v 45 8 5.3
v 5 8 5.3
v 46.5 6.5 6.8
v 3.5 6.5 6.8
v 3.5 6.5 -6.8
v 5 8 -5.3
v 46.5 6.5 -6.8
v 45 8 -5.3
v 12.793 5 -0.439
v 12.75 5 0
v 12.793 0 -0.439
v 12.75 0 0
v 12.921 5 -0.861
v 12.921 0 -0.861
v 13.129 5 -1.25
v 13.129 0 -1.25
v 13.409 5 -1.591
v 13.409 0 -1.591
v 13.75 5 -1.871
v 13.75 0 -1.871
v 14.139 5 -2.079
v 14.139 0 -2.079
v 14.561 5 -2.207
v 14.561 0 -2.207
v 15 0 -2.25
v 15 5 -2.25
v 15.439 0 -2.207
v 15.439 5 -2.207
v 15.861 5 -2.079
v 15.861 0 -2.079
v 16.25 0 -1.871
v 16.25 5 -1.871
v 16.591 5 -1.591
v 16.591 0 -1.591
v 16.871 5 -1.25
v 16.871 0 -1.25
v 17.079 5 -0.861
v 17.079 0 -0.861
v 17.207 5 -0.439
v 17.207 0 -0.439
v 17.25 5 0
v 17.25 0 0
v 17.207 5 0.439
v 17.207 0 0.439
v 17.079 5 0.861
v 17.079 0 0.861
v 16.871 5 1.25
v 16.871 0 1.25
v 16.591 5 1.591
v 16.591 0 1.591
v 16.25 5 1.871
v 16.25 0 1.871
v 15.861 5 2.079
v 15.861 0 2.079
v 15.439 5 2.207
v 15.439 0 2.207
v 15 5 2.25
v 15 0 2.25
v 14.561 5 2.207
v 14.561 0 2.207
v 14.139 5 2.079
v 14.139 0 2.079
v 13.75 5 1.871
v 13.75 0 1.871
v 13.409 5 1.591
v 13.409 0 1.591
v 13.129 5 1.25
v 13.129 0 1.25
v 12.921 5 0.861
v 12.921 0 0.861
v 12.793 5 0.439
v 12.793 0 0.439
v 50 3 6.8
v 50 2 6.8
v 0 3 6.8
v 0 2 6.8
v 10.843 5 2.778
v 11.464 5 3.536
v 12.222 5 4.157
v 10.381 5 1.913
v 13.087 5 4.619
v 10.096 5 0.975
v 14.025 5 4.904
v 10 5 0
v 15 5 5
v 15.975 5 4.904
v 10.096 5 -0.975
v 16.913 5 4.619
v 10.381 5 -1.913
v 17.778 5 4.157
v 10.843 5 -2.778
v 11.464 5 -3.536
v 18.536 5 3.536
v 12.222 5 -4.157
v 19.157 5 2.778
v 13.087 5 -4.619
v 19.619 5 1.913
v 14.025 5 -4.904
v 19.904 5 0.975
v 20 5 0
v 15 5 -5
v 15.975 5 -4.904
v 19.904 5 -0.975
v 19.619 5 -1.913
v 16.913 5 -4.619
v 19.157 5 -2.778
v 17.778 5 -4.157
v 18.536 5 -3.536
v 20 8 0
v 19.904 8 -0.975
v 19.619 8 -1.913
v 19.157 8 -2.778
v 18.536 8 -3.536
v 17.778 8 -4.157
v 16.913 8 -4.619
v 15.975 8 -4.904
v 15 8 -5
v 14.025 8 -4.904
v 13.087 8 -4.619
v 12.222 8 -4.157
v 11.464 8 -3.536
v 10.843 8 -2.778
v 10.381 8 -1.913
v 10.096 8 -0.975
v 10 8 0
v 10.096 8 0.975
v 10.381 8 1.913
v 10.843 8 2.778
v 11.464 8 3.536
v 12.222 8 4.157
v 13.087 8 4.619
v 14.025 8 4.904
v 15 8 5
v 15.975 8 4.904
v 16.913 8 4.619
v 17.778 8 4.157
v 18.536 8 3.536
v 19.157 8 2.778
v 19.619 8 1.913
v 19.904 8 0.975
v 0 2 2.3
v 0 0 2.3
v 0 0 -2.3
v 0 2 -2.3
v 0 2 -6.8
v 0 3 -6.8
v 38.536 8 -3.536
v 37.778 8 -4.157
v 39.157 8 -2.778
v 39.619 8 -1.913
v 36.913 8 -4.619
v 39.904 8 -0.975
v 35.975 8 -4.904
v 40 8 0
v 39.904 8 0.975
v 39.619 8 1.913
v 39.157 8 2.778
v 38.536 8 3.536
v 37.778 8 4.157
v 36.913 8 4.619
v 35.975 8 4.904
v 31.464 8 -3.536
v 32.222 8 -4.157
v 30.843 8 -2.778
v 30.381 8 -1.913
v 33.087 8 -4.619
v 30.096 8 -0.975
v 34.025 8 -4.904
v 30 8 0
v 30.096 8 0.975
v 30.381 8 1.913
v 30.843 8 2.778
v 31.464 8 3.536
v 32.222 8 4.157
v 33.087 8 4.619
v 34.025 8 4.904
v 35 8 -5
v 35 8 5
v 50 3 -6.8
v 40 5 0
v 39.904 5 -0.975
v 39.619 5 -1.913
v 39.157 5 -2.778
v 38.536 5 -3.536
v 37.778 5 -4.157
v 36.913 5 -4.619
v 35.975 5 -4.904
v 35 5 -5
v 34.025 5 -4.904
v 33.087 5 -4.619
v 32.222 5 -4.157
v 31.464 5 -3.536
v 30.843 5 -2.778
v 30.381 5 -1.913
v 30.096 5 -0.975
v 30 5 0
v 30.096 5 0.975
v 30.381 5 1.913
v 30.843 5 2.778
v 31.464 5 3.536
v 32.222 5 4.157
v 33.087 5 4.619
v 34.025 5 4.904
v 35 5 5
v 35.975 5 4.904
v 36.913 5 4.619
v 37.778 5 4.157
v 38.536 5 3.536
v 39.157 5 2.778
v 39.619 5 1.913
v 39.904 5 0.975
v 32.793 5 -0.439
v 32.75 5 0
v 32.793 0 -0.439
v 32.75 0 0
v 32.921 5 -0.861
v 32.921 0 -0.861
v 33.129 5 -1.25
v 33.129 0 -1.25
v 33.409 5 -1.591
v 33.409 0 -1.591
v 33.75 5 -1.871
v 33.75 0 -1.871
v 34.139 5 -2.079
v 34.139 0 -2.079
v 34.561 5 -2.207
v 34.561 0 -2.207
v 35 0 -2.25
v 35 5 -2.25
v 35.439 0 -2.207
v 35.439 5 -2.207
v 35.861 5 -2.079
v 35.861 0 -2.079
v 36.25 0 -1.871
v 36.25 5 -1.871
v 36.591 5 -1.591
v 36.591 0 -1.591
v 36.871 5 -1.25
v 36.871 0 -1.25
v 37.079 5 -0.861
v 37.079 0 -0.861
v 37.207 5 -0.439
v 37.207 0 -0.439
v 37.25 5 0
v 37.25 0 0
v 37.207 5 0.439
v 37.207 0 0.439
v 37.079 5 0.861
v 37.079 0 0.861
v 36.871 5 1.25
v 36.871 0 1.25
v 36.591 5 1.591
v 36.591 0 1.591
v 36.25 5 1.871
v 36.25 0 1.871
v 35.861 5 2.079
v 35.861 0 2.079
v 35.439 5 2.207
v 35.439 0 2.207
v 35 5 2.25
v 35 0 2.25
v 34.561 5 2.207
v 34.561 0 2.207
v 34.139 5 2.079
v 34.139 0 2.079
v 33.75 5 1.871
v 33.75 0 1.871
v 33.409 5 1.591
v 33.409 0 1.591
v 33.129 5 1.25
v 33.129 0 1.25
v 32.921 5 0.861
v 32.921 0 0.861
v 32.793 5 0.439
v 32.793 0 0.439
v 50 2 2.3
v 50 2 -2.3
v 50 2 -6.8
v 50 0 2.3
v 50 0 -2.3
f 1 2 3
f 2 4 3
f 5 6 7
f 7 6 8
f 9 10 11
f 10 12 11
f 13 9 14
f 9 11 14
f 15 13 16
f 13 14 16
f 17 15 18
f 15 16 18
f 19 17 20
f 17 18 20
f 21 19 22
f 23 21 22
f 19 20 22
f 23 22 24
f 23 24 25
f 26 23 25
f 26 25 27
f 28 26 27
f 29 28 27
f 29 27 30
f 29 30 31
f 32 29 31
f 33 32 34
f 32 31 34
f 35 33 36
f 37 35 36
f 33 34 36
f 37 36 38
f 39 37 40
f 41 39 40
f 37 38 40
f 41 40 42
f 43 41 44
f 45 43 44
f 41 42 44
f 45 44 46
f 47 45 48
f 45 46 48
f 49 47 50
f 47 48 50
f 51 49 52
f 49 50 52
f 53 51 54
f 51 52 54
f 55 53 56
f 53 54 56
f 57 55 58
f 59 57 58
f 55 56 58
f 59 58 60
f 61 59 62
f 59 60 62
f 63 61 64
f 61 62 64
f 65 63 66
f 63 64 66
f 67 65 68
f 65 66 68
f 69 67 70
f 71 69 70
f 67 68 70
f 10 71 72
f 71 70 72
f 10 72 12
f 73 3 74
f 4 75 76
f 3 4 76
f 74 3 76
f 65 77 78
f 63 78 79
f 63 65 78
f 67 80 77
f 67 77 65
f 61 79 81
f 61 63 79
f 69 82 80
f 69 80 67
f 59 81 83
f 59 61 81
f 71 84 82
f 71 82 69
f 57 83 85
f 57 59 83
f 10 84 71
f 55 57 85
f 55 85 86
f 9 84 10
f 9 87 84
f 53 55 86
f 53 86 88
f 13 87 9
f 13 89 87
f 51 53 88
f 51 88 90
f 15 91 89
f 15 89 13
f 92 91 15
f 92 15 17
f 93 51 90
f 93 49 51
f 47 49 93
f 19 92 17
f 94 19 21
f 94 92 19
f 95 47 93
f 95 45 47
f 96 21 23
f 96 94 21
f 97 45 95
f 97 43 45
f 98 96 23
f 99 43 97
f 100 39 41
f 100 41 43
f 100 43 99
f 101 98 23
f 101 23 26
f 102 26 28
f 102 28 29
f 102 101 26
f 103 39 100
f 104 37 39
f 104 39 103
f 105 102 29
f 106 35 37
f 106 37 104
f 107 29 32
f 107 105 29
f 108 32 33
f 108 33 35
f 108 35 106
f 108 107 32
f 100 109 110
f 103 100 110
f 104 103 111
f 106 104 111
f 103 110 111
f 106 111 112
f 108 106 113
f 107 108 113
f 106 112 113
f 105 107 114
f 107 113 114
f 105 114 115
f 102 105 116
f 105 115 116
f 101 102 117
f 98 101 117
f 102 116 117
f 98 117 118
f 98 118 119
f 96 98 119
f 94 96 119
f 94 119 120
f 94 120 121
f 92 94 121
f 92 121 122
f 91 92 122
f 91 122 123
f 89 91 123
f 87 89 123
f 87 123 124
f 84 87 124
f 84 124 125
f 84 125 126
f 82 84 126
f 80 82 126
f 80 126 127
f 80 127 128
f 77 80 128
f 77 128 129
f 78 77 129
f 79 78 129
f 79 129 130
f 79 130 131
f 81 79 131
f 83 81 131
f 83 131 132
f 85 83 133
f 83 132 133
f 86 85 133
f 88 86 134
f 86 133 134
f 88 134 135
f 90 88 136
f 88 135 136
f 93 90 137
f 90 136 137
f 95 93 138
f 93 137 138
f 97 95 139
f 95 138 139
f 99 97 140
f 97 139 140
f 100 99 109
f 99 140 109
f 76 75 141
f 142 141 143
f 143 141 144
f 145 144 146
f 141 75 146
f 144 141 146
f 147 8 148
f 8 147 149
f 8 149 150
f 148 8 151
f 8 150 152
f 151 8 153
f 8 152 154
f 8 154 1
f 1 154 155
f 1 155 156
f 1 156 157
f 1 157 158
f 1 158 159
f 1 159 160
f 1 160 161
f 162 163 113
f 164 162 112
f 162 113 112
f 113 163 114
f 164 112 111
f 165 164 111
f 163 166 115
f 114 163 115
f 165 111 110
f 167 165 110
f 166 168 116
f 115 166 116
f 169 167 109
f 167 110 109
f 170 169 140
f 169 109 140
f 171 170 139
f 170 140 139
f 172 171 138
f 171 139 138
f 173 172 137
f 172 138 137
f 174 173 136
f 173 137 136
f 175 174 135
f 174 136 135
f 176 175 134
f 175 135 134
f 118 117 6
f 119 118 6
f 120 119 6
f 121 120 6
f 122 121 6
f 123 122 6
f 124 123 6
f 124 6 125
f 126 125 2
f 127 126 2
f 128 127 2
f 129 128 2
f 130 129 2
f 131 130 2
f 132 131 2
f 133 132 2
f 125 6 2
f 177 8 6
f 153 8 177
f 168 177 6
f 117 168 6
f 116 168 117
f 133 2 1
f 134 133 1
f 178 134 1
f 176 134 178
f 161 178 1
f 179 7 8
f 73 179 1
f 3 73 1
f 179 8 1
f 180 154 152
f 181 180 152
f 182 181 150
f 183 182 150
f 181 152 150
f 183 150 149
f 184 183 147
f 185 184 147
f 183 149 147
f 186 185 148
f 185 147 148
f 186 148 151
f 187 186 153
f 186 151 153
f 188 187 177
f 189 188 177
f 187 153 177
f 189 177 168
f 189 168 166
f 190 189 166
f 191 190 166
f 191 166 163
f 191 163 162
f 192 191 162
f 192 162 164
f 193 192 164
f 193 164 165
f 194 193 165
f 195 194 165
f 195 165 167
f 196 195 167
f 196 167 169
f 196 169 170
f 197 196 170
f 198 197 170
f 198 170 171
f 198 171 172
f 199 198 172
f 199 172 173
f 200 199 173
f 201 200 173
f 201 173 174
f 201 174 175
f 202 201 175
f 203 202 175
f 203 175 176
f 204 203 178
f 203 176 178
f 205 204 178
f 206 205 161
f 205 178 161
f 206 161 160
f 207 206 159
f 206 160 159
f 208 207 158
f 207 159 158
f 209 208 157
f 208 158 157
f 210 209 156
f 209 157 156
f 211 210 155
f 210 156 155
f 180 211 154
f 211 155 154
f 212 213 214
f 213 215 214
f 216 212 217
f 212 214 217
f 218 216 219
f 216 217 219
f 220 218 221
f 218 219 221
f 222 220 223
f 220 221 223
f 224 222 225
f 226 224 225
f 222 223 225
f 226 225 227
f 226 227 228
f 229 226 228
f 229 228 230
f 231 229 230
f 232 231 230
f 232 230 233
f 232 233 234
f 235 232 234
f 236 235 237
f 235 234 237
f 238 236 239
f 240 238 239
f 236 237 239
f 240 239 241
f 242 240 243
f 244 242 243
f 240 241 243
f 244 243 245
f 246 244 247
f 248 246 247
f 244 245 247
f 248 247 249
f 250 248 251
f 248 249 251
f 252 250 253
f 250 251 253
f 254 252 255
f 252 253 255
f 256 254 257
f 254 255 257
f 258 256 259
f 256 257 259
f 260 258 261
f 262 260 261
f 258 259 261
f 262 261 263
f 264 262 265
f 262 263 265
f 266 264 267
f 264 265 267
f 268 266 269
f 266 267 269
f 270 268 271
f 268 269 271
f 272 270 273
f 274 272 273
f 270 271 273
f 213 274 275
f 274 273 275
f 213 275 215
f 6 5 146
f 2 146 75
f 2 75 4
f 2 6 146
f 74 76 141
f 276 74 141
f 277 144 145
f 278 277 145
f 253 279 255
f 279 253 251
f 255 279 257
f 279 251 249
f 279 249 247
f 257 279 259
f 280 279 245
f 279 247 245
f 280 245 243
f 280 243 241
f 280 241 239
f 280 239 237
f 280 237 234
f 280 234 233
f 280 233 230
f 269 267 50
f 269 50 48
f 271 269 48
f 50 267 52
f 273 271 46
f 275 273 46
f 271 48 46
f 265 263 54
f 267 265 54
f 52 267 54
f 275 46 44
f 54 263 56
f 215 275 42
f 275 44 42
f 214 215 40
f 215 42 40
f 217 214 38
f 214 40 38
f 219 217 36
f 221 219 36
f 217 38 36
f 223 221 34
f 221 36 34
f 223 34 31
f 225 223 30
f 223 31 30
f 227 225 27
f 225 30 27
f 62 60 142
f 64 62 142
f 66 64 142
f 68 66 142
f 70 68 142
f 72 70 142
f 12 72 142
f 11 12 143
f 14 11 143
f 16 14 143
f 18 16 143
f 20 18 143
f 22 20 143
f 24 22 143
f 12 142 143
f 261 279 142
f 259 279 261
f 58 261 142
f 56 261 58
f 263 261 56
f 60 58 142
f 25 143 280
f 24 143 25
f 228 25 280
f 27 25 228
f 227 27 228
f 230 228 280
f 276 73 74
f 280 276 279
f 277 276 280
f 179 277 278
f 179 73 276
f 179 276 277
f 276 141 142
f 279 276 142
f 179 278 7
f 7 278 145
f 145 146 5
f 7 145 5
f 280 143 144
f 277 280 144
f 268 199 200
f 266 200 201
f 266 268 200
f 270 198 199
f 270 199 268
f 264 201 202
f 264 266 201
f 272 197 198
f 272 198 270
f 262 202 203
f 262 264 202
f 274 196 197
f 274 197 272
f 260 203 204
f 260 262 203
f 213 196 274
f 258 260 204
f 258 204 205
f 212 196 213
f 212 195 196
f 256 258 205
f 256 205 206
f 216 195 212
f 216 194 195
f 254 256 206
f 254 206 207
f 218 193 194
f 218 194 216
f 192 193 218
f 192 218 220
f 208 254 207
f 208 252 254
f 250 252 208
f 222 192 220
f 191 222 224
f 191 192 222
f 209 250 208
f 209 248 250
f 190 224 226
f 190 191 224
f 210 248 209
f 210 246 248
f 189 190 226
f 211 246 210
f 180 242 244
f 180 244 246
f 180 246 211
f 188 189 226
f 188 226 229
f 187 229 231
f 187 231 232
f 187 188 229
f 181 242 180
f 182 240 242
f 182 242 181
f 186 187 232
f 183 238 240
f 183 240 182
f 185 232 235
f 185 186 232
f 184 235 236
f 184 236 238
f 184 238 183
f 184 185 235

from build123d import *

# Parameters (mm, degrees)
ESTRUSIONE_ESTRUSIONE1_DEPTH                         = 50
SMUSSO1_SIZE                                         = 1.5
SMUSSO2_SIZE                                         = 5
FORO_LAMATO_PER_BULLONE_M5_A_TESTA_ESAGO_D           = 4.5
FORO_LAMATO_PER_BULLONE_M5_A_TESTA_ESAGO_DEPTH       = 70
FORO_LAMATO_PER_BULLONE_M5_A_TESTA_ESAGO_CBORE_D     = 10
FORO_LAMATO_PER_BULLONE_M5_A_TESTA_ESAGO_CBORE_DEPTH = 3
FORO_LAMATO_PER_BULLONE_M5_A_TESTA_ESAGO_TIP         = 1.351936393


with BuildPart() as part:
    # Schizzo1 → Estrusione-Estrusione1 (new body)
    with BuildSketch(Plane(origin=(0, 0, 0), x_dir=(0, 0, -1), z_dir=(1, 0, 0))):
        Polygon((-2.3, 0), (2.3, 0), (2.3, 2), (6.8, 2), (6.8, 8), (-6.8, 8), (-6.8, 2), (-2.3, 2), align=None)
    extrude(amount=ESTRUSIONE_ESTRUSIONE1_DEPTH)

    # Smusso1
    smusso1_edges = [part.edges().sort_by_distance(p)[0] for p in [
        (25, 8, 6.8),
        (25, 8, -6.8),
    ]]
    chamfer(smusso1_edges, length=SMUSSO1_SIZE)

    # Smusso2
    smusso2_edges = [part.edges().sort_by_distance(p)[0] for p in [
        (50, 8, 0),
        (0, 8, 0),
    ]]
    chamfer(smusso2_edges, length=SMUSSO2_SIZE)

    # Foro lamato per Bullone M5 a testa esagonale-1
    with Locations(Plane(origin=(0, 8, 0), x_dir=(1, 0, 0), z_dir=(0, 1, 0))):
        with Locations((15, 0), (35, 0)):
            CounterBoreHole(FORO_LAMATO_PER_BULLONE_M5_A_TESTA_ESAGO_D / 2, FORO_LAMATO_PER_BULLONE_M5_A_TESTA_ESAGO_CBORE_D / 2, FORO_LAMATO_PER_BULLONE_M5_A_TESTA_ESAGO_CBORE_DEPTH, depth=FORO_LAMATO_PER_BULLONE_M5_A_TESTA_ESAGO_DEPTH)
            with Locations((0, 0, -(FORO_LAMATO_PER_BULLONE_M5_A_TESTA_ESAGO_DEPTH + FORO_LAMATO_PER_BULLONE_M5_A_TESTA_ESAGO_TIP / 2))):  # 118° drill point
                Cone(0, FORO_LAMATO_PER_BULLONE_M5_A_TESTA_ESAGO_D / 2, FORO_LAMATO_PER_BULLONE_M5_A_TESTA_ESAGO_TIP, mode=Mode.SUBTRACT)


solid = part.part
